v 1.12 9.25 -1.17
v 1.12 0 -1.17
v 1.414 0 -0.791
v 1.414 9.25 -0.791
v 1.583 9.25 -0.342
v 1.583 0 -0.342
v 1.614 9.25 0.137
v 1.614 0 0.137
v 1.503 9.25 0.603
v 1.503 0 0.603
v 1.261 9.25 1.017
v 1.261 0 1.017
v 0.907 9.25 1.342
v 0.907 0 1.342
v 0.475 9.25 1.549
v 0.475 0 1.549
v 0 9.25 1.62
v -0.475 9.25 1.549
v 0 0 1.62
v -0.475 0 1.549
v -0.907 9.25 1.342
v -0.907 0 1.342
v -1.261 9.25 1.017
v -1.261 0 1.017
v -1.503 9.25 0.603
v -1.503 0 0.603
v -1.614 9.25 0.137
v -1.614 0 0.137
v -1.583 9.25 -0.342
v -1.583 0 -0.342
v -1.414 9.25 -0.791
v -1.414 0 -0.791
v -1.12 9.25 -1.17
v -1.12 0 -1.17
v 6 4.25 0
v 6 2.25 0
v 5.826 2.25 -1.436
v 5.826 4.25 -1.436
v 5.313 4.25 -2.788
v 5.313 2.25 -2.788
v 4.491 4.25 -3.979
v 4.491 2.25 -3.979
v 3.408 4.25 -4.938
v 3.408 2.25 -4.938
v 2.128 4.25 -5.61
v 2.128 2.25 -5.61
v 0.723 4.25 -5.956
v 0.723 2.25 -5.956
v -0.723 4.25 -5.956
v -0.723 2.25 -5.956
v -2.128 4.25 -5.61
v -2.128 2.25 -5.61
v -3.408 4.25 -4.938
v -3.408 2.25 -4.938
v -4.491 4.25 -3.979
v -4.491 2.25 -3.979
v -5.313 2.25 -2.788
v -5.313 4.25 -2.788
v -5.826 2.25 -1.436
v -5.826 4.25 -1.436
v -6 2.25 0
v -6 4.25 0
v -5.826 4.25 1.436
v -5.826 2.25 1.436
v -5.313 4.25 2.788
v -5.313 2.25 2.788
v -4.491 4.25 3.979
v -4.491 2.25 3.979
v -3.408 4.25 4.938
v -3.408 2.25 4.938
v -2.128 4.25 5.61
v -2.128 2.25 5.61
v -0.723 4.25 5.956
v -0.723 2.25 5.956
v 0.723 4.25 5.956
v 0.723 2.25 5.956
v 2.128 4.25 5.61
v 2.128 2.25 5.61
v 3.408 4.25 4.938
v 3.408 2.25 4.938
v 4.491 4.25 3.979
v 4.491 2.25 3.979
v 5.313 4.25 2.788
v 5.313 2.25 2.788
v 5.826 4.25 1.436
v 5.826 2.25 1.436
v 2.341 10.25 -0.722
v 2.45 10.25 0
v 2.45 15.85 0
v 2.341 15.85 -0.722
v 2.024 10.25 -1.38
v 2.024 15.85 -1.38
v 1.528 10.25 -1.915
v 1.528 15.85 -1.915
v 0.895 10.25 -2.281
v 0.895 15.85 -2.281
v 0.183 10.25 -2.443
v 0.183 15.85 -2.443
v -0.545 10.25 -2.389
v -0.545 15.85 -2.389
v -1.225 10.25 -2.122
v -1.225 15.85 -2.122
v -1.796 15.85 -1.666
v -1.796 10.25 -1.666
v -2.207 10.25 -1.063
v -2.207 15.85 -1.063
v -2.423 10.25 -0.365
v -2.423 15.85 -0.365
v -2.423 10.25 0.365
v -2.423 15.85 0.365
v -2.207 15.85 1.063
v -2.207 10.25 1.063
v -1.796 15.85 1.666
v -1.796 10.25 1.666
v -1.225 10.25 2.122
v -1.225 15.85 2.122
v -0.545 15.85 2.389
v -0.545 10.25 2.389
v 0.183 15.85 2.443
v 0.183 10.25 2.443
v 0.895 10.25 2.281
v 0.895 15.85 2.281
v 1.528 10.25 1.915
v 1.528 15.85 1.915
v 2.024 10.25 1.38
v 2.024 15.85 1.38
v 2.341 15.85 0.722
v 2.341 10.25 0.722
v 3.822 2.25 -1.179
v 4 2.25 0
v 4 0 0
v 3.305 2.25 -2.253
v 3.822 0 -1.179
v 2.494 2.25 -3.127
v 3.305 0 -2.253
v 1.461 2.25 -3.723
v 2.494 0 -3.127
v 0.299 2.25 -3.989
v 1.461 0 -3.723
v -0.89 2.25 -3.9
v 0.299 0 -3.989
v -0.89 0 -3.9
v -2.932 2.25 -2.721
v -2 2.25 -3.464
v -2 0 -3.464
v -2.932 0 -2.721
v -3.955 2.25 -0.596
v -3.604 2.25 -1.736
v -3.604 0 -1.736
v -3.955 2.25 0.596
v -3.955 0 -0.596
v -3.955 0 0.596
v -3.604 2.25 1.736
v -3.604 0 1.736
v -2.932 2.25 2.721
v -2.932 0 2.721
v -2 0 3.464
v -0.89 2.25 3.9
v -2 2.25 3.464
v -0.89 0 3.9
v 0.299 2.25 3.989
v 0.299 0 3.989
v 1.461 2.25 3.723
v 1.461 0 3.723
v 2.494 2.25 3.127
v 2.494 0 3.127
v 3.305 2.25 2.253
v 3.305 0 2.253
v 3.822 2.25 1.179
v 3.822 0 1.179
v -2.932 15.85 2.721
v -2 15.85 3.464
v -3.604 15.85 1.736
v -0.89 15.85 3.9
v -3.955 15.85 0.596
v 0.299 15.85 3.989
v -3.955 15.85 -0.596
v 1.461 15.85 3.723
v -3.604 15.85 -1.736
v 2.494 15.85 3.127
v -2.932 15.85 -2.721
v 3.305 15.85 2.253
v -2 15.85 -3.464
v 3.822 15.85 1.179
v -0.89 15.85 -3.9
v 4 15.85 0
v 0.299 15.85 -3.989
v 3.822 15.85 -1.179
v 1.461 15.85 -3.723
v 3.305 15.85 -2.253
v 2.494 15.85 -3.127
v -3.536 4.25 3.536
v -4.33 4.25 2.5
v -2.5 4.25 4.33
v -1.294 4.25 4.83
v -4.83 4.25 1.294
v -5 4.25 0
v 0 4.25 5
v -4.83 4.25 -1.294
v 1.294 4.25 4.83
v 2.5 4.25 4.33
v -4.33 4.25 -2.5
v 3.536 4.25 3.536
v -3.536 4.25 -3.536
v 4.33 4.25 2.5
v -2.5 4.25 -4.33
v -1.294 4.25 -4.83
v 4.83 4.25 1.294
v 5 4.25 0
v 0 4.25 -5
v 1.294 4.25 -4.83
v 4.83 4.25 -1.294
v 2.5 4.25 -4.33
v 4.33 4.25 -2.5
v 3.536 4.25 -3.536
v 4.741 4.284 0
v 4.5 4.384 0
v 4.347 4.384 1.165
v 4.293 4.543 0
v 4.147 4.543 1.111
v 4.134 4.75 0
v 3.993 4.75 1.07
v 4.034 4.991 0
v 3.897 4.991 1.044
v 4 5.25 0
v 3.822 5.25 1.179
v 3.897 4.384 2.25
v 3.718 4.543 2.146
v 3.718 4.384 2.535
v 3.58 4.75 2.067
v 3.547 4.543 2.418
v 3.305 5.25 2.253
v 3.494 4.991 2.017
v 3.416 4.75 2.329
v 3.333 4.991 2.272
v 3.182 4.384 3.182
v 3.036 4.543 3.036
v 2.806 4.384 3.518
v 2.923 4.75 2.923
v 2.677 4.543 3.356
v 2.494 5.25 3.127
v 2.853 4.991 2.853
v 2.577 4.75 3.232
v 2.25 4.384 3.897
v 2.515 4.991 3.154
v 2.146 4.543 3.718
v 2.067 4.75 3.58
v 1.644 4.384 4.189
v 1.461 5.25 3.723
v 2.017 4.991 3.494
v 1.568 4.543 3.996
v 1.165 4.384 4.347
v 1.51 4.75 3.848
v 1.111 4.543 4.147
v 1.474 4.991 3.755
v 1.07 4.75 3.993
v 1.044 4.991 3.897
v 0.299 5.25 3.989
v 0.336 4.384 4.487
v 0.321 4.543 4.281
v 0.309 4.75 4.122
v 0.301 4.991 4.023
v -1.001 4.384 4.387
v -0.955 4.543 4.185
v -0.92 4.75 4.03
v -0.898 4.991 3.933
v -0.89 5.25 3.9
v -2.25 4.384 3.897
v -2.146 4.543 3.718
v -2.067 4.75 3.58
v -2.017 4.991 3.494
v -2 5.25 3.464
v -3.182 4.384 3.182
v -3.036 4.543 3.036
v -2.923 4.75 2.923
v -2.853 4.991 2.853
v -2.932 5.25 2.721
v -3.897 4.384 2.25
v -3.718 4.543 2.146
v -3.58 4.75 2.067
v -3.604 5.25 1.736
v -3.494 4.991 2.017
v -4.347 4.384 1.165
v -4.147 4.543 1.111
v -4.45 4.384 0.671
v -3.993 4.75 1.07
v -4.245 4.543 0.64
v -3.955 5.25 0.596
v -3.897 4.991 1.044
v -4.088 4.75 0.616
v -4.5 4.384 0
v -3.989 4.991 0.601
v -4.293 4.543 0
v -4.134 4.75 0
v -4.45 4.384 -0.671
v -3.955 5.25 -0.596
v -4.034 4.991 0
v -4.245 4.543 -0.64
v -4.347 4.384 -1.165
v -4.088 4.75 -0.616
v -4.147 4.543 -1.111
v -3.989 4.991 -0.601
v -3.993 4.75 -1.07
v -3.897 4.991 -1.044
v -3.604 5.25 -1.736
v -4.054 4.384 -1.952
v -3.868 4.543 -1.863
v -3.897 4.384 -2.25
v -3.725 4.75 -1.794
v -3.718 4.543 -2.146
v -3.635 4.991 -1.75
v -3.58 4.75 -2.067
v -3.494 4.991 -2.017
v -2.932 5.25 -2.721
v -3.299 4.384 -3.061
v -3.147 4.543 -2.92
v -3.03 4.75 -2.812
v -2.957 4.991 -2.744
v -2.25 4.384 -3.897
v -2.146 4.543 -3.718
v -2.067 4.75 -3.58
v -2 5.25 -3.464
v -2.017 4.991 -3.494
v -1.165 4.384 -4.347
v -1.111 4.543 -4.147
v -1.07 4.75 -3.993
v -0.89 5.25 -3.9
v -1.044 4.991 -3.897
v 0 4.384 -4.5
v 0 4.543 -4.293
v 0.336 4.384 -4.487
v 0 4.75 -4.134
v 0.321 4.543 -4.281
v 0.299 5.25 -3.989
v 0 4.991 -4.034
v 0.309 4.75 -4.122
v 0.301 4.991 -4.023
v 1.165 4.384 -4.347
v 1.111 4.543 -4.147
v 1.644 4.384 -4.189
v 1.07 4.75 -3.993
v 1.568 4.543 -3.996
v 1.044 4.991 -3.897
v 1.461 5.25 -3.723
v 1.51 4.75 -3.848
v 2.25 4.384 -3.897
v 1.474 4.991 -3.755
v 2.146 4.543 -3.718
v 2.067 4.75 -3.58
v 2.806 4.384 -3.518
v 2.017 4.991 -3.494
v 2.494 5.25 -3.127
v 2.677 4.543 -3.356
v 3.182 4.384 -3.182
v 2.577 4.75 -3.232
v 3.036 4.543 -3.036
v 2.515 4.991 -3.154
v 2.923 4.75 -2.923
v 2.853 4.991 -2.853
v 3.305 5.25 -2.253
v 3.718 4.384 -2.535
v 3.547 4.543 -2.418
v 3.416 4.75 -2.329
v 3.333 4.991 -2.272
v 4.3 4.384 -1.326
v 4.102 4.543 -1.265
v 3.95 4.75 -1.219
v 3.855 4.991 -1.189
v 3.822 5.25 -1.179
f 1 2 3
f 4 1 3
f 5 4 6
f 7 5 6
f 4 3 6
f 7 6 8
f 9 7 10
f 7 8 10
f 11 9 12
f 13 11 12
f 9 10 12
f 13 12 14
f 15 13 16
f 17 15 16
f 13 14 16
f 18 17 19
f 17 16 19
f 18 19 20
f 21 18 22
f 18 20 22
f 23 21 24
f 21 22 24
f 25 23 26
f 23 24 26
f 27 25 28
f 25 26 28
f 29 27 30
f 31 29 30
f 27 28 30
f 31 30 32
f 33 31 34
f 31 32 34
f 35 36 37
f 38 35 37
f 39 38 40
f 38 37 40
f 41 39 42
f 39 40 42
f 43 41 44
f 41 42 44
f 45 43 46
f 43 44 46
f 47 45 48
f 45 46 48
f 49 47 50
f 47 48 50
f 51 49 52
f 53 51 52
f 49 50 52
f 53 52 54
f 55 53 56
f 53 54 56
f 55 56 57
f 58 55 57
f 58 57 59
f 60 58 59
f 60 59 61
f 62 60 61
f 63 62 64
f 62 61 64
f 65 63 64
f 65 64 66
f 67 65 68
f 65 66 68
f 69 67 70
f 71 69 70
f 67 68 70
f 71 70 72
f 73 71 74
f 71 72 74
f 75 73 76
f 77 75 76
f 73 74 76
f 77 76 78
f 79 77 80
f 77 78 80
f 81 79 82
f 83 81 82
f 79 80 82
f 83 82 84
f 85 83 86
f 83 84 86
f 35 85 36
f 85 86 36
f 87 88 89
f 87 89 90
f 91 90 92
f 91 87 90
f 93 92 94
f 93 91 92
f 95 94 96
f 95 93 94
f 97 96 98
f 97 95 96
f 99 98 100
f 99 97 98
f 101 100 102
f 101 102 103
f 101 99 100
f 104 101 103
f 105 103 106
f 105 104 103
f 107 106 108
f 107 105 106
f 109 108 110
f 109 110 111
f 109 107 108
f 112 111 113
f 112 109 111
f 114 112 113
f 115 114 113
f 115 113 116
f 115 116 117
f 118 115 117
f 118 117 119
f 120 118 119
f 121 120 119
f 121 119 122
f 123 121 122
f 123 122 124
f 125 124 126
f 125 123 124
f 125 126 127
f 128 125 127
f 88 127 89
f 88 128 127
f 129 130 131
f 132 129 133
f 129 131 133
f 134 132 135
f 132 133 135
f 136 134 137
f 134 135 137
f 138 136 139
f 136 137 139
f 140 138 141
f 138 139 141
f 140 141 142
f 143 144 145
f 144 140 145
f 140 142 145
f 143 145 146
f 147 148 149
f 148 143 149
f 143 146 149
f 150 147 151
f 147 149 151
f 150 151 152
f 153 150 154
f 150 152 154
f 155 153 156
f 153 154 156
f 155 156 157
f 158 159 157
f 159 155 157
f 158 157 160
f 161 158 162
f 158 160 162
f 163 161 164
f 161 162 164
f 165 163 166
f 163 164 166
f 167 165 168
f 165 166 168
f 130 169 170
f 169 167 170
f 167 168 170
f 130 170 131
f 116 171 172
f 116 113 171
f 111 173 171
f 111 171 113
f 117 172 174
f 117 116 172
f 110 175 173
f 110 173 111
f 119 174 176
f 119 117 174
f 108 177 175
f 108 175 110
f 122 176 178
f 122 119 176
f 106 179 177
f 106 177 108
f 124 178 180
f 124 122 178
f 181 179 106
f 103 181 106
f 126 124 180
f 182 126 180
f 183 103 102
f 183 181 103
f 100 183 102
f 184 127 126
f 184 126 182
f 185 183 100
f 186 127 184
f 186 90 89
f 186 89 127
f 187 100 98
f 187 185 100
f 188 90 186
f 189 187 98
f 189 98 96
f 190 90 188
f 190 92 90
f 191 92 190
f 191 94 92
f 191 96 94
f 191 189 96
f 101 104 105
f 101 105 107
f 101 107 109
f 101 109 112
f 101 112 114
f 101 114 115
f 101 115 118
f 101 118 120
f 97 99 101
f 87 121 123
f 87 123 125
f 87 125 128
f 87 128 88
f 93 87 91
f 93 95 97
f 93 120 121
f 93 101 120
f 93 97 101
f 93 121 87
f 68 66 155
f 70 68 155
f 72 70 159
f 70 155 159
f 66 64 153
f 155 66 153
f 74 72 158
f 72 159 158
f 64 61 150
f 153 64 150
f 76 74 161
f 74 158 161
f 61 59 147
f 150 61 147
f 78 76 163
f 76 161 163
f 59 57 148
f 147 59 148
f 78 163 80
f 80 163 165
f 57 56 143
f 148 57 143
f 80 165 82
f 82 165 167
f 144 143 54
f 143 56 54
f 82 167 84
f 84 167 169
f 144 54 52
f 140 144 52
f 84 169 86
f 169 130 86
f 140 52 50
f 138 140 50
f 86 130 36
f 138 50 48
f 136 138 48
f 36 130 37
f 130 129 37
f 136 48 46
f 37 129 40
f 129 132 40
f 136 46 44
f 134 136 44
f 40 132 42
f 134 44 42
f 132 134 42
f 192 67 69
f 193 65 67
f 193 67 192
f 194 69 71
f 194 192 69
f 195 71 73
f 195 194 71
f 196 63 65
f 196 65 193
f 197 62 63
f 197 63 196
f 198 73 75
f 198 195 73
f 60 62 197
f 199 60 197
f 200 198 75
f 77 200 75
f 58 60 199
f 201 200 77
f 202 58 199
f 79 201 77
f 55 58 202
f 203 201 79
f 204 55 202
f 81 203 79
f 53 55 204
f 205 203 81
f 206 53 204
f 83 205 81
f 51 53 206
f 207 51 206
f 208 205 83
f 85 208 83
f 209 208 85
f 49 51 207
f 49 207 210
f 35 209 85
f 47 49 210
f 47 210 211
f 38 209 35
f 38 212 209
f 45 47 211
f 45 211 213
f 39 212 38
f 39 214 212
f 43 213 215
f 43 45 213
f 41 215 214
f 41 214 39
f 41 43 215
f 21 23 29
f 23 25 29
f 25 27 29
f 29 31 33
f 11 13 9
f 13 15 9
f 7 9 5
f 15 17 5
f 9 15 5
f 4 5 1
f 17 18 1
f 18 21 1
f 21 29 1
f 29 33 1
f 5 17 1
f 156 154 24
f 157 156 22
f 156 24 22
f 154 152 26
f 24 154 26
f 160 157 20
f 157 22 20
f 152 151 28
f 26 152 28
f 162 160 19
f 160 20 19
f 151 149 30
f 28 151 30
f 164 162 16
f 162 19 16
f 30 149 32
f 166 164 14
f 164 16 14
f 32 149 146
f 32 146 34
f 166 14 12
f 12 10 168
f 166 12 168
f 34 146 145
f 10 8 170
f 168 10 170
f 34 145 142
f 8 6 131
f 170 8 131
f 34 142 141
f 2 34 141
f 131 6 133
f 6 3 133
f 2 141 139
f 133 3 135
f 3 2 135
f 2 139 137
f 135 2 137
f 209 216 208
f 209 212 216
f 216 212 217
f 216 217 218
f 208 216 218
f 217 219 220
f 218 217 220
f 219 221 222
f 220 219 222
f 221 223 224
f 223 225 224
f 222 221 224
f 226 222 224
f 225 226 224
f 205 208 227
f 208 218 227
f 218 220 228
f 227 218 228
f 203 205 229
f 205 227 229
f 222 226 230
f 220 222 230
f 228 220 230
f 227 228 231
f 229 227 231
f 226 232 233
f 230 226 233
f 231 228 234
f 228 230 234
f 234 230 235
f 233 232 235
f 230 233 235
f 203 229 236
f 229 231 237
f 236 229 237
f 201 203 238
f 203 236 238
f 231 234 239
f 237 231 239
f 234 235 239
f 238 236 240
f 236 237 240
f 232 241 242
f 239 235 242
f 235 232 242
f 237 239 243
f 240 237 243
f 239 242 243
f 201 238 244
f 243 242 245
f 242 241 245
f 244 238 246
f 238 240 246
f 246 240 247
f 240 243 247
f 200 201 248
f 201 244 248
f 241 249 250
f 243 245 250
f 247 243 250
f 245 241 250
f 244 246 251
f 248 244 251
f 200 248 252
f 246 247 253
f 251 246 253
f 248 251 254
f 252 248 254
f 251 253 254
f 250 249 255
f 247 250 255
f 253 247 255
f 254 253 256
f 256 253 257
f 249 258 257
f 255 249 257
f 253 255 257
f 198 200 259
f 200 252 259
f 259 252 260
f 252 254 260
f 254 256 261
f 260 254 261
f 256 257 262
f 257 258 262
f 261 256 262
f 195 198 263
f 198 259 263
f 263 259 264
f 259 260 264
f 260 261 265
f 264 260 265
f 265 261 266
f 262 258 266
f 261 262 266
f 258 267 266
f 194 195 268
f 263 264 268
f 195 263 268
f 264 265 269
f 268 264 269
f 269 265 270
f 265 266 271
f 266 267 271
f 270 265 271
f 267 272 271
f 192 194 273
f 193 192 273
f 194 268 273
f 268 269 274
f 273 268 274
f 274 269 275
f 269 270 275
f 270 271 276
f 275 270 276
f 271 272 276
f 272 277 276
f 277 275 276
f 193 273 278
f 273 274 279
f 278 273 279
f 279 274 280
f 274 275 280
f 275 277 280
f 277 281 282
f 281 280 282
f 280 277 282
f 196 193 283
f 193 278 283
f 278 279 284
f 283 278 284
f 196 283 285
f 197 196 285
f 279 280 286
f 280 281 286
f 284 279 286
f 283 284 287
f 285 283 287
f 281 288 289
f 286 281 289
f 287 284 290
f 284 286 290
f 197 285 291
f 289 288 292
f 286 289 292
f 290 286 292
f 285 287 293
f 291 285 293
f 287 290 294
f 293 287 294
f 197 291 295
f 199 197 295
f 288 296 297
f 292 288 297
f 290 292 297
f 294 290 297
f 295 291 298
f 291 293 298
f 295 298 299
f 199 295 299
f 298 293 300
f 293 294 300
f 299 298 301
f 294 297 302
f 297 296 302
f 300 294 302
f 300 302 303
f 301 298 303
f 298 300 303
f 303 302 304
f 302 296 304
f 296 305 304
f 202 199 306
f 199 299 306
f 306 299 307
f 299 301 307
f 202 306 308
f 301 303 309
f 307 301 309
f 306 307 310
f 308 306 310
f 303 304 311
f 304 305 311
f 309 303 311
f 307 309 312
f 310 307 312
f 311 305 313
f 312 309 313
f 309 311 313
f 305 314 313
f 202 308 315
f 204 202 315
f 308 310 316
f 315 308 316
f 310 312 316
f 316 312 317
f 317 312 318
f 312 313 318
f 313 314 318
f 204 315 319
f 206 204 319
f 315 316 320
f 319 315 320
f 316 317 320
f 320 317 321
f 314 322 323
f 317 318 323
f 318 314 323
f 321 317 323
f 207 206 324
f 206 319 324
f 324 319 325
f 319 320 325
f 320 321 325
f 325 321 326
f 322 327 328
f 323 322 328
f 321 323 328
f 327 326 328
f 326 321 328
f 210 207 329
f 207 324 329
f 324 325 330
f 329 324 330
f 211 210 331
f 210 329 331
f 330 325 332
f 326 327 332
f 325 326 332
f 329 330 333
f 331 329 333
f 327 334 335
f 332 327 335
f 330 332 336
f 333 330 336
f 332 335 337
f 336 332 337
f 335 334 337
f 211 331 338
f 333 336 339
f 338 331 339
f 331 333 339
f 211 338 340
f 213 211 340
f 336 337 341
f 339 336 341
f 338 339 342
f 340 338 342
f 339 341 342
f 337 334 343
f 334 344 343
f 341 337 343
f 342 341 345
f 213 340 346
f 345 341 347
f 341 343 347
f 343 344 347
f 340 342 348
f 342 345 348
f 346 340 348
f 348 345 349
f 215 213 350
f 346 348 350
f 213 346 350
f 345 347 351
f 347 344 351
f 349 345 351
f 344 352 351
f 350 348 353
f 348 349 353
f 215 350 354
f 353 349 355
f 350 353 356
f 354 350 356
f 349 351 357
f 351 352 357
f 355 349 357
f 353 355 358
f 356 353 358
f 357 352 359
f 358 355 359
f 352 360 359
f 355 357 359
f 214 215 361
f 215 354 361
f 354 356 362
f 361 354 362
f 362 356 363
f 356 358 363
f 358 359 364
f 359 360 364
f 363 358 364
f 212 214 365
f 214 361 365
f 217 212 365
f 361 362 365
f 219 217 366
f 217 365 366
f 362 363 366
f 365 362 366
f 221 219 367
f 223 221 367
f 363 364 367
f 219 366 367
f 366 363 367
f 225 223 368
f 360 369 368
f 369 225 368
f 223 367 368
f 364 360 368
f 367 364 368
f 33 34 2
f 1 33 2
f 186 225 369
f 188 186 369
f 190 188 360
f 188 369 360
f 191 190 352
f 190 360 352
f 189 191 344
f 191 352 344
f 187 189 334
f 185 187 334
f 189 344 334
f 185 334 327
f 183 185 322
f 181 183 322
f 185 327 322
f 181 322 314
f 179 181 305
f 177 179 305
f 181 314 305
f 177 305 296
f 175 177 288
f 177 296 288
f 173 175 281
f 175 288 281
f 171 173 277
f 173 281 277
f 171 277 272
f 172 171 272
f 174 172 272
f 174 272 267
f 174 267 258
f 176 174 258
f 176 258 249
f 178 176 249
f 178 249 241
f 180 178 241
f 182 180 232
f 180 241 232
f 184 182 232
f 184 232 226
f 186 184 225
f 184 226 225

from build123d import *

# Parameters (mm, degrees)
SKETCH1_R           = 4
BOSS_EXTRUDE1_DEPTH = 9.25
SKETCH2_R           = 4
BOSS_EXTRUDE2_DEPTH = 1
SKETCH3_R           = 4
SKETCH3_R_2         = 2.45
BOSS_EXTRUDE3_DEPTH = 5.6
SKETCH5_R           = 6
BOSS_EXTRUDE4_DEPTH = 2
FILLET1_R           = 1


with BuildPart() as part:
    # Sketch1 → Boss-Extrude1 (new body)
    with BuildSketch(Plane(origin=(0, 0, 0), x_dir=(1, 0, 0), z_dir=(0, 1, 0))):
        Circle(SKETCH1_R)
        with BuildLine():
            Line((-1.12, 1.170469991), (1.12, 1.170469991))
            ThreePointArc((1.12, 1.170469991), (0, -1.62), (-1.12, 1.170469991))
        make_face(mode=Mode.SUBTRACT)
    extrude(amount=BOSS_EXTRUDE1_DEPTH)

    # Sketch2 → Boss-Extrude2 (add)
    with BuildSketch(Plane(origin=(0, 9.25, 0), x_dir=(1, 0, 0), z_dir=(0, 1, 0))):
        Circle(SKETCH2_R)
    extrude(amount=BOSS_EXTRUDE2_DEPTH)

    # Sketch3 → Boss-Extrude3 (add)
    with BuildSketch(Plane(origin=(0, 10.25, 0), x_dir=(1, 0, 0), z_dir=(0, 1, 0))):
        Circle(SKETCH3_R)
        Circle(SKETCH3_R_2, mode=Mode.SUBTRACT)
    extrude(amount=BOSS_EXTRUDE3_DEPTH)

    # Sketch5 → Boss-Extrude4 (add)
    with BuildSketch(Plane(origin=(0, 2.25, 0), x_dir=(1, 0, 0), z_dir=(0, 1, 0))):
        Circle(SKETCH5_R)
        with BuildLine():
            Line((1.12, 1.170469991), (-1.12, 1.170469991))
            ThreePointArc((-1.12, 1.170469991), (0, -1.62), (1.12, 1.170469991))
        make_face(mode=Mode.SUBTRACT)
    extrude(amount=BOSS_EXTRUDE4_DEPTH)

    # Fillet1
    fillet1_edges = [part.edges().sort_by_distance(p)[0] for p in [
        (-4, 4.25, 0),
    ]]
    fillet(fillet1_edges, radius=FILLET1_R)


solid = part.part
